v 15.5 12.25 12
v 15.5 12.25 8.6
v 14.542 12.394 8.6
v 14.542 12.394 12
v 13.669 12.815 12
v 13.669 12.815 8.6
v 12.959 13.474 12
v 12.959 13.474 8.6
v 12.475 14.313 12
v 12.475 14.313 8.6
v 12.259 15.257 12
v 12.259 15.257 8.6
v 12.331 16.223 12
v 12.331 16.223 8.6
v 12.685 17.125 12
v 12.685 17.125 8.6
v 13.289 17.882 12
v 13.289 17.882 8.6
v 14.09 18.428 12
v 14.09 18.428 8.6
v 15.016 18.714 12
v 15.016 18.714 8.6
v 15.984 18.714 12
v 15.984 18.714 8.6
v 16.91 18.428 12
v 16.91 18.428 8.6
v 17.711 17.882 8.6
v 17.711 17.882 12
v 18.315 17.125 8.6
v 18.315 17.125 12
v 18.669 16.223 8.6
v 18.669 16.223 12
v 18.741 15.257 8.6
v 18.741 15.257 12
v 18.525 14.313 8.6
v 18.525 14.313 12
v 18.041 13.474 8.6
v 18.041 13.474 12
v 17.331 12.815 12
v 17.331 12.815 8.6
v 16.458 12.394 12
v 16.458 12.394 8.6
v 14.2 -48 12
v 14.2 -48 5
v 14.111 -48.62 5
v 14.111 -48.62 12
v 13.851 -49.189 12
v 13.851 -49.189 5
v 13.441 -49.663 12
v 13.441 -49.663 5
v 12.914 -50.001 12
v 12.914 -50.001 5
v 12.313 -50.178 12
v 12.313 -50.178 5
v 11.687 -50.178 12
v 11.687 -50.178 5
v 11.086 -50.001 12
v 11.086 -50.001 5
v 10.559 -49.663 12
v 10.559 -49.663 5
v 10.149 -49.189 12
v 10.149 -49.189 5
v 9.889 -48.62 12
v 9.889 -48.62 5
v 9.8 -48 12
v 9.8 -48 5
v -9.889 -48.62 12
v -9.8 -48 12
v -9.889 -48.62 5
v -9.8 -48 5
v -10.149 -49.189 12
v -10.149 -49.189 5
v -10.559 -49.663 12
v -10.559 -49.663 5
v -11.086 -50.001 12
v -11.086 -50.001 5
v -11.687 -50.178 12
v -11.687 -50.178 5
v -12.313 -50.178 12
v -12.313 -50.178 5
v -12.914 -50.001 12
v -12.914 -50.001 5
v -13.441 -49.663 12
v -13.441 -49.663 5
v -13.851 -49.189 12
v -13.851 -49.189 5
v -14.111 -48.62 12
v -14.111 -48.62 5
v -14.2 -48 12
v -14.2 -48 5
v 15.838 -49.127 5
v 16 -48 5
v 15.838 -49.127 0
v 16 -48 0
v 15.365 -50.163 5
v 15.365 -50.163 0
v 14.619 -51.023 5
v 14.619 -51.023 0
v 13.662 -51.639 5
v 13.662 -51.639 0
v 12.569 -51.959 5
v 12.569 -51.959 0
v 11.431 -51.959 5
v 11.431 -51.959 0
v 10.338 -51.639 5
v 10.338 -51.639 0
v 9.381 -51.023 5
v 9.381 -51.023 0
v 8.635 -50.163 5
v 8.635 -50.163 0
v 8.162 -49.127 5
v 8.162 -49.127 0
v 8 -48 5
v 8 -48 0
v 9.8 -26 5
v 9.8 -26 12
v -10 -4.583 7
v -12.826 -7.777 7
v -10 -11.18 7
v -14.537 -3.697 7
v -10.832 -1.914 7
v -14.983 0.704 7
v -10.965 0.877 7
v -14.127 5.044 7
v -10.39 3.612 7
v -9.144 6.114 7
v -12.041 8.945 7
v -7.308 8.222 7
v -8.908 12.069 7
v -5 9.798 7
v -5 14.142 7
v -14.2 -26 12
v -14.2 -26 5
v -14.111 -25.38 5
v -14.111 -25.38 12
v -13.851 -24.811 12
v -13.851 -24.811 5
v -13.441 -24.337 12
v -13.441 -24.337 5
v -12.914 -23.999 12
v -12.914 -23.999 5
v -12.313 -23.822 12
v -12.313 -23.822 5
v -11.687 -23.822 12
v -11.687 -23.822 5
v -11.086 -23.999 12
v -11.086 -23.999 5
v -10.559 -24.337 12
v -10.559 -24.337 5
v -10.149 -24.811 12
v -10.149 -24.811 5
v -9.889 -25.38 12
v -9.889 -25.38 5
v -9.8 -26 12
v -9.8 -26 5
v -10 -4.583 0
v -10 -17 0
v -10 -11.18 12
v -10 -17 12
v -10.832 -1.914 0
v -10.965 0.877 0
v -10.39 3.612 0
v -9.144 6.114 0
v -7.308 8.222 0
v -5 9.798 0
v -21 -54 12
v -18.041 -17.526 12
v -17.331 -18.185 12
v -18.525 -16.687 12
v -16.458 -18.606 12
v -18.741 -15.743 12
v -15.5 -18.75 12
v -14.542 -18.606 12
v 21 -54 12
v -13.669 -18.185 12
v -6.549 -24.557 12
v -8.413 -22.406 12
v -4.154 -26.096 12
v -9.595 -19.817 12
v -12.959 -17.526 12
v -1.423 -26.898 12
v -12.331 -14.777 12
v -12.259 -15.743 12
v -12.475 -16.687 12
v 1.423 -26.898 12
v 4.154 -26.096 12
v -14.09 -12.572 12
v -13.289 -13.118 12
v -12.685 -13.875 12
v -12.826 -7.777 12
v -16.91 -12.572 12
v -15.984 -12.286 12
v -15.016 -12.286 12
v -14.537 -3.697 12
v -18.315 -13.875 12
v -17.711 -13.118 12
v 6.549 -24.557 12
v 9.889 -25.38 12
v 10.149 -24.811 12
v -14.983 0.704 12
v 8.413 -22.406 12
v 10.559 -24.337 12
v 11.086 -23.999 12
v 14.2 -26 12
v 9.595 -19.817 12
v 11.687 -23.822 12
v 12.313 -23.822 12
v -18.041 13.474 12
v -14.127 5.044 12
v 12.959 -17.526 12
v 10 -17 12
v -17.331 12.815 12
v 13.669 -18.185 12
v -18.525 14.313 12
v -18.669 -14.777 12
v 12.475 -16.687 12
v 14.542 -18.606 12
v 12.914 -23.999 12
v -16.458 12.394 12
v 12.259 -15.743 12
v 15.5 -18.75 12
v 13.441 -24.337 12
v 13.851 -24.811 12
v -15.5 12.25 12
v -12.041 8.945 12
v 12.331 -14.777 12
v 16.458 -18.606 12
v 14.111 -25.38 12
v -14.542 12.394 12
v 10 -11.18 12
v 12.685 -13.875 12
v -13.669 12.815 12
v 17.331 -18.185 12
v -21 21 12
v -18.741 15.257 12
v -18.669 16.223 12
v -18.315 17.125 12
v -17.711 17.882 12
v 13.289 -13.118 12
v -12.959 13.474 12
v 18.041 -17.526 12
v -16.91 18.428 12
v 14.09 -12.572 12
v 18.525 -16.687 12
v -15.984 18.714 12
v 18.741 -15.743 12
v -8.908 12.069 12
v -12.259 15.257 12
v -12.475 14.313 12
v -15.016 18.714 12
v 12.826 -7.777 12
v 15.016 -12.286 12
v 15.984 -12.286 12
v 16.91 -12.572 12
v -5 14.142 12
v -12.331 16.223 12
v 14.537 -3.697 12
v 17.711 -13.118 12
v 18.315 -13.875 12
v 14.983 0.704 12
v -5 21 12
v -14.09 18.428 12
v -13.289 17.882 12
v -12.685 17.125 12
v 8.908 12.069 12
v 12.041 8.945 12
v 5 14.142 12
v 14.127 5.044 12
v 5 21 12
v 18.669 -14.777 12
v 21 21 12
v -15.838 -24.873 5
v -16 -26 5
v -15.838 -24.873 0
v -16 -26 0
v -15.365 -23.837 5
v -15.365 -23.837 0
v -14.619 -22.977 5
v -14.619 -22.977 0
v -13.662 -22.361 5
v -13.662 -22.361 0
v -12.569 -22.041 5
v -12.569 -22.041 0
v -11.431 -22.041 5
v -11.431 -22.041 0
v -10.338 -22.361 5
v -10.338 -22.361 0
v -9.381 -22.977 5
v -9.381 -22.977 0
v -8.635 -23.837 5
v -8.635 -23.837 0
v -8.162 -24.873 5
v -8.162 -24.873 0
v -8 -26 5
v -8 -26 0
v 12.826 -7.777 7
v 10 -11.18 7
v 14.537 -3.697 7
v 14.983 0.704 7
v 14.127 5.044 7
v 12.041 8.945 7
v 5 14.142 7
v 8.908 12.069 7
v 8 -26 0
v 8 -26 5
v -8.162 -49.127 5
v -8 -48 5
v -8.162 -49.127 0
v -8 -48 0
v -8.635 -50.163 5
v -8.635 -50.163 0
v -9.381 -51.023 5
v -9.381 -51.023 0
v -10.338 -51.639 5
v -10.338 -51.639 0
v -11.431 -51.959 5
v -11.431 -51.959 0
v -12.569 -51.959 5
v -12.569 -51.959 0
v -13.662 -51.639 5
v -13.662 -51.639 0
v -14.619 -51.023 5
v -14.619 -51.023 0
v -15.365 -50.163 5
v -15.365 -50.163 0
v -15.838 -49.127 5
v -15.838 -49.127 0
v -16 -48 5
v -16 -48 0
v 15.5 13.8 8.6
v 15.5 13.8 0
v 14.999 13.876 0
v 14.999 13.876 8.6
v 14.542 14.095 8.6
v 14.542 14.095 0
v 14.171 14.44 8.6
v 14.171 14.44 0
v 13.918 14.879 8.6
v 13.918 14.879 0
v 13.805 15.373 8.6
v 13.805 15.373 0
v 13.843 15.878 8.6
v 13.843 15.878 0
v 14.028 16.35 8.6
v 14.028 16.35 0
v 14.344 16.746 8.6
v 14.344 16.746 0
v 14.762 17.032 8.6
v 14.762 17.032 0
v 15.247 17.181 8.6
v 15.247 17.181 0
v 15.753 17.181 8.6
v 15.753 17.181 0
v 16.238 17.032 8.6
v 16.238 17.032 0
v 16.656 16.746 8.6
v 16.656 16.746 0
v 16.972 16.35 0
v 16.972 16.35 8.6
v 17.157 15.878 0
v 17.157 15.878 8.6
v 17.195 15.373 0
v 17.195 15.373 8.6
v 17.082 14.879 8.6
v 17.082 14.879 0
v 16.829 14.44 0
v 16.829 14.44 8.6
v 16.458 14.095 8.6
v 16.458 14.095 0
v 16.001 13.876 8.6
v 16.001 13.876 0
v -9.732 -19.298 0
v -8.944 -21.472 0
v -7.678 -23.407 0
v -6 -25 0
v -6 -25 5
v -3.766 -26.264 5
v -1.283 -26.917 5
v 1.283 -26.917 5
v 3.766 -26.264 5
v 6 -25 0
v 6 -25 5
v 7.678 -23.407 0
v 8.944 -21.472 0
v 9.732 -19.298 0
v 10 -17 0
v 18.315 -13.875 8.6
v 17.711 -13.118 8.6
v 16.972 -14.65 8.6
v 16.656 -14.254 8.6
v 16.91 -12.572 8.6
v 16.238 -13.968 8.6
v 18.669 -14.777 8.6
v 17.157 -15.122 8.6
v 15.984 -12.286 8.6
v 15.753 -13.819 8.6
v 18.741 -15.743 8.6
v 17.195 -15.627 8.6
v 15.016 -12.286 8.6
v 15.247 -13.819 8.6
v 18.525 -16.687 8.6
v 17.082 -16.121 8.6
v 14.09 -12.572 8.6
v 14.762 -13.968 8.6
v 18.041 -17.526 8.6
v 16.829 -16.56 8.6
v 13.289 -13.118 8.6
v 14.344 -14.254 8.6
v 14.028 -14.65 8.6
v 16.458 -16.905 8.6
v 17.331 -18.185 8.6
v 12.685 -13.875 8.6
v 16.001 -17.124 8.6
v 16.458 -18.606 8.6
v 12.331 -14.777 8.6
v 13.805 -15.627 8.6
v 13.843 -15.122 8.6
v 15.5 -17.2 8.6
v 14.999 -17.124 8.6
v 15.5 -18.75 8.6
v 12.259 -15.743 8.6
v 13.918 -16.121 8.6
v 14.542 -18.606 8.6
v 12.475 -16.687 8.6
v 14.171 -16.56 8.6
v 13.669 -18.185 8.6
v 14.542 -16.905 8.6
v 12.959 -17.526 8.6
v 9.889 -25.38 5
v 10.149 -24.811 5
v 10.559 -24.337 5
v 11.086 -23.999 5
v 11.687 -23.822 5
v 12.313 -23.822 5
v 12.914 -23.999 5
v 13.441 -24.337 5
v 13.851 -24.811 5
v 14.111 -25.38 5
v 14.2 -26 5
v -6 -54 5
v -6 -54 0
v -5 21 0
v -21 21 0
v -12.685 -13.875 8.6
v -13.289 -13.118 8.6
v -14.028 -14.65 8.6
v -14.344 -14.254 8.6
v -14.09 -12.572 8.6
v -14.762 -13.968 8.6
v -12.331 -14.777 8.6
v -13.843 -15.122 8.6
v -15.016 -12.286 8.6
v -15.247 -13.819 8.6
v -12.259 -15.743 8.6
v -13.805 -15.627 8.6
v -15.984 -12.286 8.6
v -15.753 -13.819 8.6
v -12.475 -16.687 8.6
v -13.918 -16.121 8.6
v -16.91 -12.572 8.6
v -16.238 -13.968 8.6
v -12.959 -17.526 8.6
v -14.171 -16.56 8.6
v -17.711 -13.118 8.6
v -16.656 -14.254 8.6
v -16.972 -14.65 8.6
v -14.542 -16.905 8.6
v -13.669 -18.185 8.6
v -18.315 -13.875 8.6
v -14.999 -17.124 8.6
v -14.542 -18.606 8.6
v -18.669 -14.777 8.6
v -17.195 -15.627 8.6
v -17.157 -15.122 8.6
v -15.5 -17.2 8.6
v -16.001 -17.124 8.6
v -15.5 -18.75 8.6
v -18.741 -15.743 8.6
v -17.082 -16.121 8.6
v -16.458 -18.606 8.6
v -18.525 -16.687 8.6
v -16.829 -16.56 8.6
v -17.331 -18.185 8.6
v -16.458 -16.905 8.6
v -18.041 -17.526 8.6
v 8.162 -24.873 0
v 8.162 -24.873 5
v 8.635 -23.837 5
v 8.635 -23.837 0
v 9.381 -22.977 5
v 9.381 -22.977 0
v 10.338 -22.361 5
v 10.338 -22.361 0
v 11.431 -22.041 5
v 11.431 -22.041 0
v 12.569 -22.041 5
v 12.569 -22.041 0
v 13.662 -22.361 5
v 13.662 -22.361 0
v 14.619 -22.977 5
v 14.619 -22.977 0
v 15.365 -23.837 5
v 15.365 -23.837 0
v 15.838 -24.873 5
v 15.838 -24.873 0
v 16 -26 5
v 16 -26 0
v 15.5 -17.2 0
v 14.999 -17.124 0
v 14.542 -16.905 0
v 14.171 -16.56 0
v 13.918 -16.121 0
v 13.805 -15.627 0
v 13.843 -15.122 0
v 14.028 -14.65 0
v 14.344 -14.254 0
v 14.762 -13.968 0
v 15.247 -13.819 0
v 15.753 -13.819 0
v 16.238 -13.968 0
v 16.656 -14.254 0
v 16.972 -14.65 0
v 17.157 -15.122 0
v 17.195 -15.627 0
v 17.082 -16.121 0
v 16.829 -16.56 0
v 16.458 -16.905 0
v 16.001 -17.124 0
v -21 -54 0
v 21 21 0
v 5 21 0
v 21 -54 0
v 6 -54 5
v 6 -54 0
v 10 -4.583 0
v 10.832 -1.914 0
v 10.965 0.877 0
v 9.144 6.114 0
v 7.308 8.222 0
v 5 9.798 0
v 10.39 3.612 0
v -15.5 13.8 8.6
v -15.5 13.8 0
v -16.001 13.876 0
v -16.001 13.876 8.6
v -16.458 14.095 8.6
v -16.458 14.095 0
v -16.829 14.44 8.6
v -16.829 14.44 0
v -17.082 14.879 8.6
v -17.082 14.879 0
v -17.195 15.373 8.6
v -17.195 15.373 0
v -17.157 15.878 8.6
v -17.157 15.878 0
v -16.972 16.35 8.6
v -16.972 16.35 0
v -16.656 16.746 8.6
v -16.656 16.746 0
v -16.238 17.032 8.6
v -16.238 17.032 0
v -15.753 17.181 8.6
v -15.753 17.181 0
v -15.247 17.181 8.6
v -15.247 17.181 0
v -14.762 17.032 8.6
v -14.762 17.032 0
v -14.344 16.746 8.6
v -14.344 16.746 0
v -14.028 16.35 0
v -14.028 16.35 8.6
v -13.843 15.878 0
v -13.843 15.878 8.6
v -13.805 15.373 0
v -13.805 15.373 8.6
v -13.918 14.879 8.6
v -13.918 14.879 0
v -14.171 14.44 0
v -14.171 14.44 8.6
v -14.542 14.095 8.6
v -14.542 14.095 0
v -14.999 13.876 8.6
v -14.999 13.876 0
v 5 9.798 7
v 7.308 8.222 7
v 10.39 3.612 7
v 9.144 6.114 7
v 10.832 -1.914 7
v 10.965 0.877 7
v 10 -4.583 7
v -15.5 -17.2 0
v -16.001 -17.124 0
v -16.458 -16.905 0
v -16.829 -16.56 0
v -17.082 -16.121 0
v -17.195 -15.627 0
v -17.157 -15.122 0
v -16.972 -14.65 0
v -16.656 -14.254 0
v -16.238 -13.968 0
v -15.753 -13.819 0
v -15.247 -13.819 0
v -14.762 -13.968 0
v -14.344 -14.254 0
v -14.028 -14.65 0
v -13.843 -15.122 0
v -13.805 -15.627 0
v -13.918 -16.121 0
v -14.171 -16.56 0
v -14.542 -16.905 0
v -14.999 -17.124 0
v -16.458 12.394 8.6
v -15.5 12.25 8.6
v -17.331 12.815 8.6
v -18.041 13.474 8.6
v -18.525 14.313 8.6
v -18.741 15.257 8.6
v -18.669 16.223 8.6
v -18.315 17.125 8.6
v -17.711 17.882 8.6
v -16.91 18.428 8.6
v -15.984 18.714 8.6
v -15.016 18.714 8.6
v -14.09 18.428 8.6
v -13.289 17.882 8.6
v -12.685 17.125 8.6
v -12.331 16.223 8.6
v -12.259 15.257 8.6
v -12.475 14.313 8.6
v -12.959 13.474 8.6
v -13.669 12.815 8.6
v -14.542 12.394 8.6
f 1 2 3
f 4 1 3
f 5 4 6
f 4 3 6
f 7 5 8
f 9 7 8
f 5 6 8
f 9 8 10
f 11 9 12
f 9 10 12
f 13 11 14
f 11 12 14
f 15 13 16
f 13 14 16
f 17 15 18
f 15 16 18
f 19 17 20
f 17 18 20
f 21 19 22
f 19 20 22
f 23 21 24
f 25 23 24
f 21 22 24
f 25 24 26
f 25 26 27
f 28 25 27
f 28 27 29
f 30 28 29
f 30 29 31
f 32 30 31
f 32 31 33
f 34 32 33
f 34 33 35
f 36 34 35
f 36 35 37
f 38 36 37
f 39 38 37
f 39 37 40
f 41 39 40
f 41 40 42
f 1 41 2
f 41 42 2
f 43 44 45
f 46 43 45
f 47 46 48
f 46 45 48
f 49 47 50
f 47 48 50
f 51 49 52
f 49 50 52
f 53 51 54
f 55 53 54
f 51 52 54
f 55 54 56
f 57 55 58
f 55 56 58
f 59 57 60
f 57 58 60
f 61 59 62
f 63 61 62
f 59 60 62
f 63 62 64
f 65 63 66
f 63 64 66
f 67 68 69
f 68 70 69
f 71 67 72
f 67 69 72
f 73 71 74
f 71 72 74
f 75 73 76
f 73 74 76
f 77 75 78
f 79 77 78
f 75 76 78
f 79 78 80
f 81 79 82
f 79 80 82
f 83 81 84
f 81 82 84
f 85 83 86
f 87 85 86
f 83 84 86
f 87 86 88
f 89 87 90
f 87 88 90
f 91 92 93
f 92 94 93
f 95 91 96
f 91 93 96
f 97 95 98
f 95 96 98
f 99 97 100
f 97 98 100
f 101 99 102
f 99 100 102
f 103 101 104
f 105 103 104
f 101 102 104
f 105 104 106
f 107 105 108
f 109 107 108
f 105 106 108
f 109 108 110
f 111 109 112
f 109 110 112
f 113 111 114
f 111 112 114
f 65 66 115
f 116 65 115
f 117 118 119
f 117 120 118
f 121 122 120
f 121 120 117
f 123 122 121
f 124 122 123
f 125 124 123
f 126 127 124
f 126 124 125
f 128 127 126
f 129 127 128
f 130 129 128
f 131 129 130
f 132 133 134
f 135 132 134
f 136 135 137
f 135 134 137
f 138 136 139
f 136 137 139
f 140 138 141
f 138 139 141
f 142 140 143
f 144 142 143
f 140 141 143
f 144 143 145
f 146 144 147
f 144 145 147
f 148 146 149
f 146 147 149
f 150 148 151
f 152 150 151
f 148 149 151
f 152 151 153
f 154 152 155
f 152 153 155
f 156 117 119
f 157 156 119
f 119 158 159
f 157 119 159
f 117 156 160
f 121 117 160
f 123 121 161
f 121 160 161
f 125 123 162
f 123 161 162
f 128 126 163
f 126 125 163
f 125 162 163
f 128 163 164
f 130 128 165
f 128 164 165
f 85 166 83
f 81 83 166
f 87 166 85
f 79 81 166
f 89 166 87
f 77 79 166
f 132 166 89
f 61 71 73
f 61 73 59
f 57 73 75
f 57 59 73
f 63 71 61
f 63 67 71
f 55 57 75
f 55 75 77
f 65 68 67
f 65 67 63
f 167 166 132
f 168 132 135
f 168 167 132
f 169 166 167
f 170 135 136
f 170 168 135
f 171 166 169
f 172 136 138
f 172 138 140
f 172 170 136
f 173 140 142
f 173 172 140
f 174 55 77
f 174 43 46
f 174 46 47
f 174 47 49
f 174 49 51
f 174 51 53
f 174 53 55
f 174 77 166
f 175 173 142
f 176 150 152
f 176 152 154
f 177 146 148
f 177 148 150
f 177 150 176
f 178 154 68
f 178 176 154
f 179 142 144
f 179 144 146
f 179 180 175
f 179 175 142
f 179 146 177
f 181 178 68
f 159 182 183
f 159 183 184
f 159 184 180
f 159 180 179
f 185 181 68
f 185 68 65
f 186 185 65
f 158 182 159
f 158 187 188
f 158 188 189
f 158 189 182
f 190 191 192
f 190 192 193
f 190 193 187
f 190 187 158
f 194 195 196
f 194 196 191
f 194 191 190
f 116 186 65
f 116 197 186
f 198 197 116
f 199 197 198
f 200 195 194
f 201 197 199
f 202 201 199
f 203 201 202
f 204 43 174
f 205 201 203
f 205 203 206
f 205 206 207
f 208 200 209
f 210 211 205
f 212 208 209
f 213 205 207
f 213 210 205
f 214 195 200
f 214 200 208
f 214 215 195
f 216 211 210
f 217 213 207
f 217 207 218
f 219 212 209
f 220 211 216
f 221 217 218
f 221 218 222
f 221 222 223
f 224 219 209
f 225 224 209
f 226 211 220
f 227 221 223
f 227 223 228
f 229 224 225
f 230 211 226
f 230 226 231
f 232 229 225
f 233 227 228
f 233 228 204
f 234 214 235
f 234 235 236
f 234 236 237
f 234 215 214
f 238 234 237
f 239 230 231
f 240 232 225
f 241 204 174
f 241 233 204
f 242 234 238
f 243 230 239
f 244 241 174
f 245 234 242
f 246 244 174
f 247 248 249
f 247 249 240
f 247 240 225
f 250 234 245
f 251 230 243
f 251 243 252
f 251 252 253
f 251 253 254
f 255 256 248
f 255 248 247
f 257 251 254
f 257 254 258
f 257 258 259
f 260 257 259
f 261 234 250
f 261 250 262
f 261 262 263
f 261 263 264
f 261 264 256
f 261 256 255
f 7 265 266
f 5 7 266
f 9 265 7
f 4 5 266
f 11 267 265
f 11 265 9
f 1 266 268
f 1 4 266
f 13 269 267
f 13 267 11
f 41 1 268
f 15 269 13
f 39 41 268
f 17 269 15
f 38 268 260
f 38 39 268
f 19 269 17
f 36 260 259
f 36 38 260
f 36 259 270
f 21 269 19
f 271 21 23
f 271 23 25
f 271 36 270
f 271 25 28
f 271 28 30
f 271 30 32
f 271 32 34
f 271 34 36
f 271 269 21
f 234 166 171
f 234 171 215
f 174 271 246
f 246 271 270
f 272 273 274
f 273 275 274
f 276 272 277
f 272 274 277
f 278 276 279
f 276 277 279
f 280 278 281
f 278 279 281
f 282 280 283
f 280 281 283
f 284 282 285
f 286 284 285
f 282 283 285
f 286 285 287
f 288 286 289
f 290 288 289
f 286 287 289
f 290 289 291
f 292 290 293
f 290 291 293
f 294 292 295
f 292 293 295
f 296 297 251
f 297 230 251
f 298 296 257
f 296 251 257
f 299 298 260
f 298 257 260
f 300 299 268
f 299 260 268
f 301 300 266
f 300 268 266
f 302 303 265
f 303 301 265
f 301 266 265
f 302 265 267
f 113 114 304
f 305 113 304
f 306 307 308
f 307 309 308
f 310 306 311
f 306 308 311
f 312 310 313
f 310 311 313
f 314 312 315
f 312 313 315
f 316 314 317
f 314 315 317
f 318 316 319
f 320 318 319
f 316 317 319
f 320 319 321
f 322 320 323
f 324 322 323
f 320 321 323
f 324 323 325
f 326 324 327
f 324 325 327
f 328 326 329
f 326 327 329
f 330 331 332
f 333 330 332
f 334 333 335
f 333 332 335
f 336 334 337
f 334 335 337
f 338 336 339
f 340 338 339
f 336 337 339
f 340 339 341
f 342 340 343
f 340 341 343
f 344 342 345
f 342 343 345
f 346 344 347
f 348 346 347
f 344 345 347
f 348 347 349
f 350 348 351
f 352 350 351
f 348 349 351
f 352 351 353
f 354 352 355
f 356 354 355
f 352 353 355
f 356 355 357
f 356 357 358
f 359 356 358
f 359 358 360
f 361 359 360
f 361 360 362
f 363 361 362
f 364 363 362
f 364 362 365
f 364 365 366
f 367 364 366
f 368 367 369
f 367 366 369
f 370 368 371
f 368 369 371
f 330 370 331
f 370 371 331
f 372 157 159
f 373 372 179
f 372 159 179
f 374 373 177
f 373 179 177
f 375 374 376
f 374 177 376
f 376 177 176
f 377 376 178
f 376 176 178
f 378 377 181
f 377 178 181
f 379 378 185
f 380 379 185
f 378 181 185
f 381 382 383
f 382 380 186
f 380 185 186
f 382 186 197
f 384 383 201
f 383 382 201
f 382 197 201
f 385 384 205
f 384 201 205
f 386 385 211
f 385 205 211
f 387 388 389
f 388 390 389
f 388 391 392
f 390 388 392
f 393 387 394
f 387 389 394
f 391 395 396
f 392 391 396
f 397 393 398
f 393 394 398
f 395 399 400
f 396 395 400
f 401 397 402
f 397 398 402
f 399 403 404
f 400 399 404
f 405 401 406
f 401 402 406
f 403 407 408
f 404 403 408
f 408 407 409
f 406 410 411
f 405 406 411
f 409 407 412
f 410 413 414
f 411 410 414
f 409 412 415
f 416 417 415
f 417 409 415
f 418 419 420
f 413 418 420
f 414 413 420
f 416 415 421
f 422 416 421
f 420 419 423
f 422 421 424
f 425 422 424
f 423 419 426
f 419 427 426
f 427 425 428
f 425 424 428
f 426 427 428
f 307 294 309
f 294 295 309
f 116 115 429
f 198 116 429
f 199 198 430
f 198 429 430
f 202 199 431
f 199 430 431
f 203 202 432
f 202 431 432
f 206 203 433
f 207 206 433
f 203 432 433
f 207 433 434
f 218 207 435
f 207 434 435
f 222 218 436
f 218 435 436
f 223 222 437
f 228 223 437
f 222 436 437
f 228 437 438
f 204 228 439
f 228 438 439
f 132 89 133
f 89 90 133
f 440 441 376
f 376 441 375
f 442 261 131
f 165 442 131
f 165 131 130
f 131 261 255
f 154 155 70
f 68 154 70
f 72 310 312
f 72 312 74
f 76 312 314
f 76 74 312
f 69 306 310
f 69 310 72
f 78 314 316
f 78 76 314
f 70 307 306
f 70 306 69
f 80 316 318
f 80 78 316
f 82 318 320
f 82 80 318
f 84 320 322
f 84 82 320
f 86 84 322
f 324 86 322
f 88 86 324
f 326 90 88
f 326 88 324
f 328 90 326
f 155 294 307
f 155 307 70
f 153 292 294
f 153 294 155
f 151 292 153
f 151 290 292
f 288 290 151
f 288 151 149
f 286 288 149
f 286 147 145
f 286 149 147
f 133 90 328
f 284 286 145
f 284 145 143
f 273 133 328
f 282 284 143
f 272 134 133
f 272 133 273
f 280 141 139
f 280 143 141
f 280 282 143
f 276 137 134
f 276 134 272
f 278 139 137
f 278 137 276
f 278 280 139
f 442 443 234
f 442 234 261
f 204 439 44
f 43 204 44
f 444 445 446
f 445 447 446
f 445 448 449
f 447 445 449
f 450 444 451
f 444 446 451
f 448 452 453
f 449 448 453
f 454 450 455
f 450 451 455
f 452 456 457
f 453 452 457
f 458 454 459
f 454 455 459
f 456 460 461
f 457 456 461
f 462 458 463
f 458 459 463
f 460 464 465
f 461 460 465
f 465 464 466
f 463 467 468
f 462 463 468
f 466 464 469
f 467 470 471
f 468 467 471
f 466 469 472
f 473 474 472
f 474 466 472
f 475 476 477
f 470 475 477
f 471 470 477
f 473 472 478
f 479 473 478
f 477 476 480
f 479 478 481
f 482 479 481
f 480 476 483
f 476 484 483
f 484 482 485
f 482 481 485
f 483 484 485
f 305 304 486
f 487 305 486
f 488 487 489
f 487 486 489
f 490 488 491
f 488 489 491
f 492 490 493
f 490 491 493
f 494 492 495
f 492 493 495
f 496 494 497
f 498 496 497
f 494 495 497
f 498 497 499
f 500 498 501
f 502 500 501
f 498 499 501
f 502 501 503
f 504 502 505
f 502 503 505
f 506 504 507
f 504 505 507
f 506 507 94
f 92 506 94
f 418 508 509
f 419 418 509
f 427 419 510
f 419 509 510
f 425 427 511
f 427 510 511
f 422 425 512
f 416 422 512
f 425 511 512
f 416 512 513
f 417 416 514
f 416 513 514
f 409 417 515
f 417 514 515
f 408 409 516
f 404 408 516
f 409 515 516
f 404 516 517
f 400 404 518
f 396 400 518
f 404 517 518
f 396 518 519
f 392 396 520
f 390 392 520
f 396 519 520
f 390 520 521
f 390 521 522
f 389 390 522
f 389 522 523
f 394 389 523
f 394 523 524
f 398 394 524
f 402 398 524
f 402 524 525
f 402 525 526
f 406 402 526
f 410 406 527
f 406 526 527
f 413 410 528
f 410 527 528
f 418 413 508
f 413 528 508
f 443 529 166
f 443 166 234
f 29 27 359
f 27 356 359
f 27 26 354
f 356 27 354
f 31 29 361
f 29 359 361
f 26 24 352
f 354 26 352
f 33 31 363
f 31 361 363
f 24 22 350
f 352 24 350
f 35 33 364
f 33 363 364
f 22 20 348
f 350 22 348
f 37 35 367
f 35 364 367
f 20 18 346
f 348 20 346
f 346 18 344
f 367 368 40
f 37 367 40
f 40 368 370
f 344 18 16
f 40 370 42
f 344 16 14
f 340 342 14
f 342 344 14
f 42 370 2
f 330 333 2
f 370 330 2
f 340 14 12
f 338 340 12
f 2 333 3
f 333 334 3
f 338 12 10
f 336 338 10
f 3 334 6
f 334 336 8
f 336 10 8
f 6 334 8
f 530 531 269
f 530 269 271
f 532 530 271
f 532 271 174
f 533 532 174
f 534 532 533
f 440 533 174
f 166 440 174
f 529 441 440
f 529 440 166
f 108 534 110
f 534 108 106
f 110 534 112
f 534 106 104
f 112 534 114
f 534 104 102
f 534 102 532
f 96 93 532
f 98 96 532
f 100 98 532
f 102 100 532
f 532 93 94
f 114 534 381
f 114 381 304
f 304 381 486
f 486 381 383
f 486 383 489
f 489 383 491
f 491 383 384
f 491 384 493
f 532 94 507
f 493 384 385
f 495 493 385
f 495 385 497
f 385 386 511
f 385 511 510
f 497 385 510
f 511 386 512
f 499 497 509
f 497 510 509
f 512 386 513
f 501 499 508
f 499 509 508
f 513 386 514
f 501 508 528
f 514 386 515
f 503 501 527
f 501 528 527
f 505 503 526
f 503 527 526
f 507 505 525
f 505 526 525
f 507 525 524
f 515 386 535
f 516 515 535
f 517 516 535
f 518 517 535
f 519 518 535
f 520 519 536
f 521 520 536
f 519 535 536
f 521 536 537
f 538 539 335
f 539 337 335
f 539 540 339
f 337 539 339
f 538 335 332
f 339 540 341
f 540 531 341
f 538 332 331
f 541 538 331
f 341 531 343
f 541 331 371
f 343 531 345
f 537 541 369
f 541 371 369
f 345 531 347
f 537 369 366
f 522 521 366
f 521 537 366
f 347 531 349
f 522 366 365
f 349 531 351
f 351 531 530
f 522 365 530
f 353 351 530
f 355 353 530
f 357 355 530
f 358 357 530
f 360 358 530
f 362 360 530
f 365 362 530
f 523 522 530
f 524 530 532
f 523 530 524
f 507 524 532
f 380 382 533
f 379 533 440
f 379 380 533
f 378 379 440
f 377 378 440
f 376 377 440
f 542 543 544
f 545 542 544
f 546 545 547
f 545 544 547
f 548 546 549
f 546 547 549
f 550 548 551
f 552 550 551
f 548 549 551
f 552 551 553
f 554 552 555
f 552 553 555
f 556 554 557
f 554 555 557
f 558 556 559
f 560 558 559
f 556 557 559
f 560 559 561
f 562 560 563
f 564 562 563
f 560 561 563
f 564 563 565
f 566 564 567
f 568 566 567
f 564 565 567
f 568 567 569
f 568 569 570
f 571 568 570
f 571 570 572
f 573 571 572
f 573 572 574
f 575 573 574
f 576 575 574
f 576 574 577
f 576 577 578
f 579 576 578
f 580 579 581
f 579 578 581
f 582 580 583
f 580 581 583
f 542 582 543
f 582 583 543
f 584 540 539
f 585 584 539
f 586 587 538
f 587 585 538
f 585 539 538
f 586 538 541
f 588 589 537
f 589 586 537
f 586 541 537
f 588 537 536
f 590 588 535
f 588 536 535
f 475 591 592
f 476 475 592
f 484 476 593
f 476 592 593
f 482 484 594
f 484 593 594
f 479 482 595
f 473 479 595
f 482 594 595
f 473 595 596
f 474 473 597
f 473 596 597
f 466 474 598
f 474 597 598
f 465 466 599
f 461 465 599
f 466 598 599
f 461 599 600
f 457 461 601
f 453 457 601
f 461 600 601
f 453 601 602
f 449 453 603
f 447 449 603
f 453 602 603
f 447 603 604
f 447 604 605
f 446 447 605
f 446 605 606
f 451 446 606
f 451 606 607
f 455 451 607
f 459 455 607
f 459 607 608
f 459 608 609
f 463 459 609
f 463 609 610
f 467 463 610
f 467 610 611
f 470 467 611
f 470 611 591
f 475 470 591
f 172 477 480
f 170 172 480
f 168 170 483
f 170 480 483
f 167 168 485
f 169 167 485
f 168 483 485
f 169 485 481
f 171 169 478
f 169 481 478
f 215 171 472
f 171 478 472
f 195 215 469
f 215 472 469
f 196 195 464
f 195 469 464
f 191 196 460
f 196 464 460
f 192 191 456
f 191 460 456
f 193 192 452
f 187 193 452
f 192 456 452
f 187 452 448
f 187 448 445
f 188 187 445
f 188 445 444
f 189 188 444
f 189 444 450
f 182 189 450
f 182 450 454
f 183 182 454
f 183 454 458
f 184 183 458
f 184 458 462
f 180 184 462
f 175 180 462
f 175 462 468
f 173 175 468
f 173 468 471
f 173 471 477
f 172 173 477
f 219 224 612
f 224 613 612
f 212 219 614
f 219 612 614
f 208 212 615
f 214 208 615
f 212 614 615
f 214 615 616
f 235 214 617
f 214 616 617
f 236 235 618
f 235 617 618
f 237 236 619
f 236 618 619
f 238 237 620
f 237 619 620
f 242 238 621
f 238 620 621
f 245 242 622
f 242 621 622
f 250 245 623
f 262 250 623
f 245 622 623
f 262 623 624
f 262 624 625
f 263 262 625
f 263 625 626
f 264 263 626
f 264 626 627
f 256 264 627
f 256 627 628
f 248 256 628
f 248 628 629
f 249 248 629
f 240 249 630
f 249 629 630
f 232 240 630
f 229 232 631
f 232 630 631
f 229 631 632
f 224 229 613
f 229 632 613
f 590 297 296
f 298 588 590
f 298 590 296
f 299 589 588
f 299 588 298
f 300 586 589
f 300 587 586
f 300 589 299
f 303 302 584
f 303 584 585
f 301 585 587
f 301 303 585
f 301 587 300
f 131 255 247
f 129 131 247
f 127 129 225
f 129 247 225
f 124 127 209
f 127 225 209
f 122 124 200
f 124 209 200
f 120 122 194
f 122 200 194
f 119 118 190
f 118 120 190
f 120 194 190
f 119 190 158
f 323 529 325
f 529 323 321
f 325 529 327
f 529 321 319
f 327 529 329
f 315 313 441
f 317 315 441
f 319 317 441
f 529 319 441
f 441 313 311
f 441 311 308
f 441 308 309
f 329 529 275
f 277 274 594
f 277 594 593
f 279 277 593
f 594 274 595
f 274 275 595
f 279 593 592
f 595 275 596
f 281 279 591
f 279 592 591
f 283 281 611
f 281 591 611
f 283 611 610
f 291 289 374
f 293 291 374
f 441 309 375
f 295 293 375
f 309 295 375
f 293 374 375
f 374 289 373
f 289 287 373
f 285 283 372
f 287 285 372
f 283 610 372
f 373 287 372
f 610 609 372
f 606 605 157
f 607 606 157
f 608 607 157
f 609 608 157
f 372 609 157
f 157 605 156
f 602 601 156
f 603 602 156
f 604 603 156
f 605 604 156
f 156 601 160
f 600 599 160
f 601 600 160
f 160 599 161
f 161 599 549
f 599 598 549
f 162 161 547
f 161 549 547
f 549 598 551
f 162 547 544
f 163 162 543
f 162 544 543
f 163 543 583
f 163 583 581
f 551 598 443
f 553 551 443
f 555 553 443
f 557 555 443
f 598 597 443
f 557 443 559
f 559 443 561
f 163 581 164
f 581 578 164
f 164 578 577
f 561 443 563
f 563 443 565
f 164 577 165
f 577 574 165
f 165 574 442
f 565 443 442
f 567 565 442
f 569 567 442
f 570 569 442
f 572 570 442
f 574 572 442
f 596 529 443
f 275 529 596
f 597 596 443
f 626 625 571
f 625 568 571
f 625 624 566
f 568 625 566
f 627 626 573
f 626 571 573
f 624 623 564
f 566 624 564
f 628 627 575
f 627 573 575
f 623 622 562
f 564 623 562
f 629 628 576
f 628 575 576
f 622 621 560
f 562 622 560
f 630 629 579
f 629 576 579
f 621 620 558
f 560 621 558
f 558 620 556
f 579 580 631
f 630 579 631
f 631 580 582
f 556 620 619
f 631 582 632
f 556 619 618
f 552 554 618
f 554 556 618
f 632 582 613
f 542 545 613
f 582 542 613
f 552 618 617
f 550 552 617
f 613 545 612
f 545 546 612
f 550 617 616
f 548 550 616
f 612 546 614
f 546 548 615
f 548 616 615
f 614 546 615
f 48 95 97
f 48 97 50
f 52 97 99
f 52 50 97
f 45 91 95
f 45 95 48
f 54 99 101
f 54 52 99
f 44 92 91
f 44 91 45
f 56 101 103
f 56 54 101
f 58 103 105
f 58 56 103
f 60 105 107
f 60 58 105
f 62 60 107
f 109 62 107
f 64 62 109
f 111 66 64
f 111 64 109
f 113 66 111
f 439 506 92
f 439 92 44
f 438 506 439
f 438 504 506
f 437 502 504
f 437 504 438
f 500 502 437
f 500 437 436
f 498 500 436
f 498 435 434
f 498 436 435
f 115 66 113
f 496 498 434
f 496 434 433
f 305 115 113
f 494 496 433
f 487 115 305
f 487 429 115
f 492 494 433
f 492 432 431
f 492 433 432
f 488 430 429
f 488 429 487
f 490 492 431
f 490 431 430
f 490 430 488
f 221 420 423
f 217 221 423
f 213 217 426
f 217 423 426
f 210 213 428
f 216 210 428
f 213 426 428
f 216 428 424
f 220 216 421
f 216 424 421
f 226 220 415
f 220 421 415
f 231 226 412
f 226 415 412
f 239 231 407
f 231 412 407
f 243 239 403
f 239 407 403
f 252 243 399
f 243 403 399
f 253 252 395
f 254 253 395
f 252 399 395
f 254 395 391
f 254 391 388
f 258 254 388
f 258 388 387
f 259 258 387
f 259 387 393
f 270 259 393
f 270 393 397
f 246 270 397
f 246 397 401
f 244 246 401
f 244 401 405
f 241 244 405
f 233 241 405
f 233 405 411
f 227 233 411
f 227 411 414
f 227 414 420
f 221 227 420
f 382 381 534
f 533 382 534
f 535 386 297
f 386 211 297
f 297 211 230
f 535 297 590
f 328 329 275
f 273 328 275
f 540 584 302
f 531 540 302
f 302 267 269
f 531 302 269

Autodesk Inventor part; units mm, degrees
ref_plane "YZ Plane" through (0, 0, 0) normal (1, 0, 0) x (0, 1, 0)
ref_plane "XZ Plane" through (0, 0, 0) normal (0, 1, 0) x (-1, 0, 0)
ref_plane "XY Plane" through (0, 0, 0) normal (0, 0, 1) x (1, 0, 0)
sketch "Skizze1" plane through (0, 0, 0) normal (0, 0, 1) x (1, 0, 0)
  line L0 (-29.4, 0) -> (29.4, 0) projected
  line L1 (0, -69) -> (0, 36) projected
  line L2 (21, -54) -> (-21, -54)
  line L3 (-21, -54) -> (-21, 21)
  line L4 (-21, 21) -> (21, 21)
  line L5 (21, 21) -> (21, -54)
  line L6 (21, -54) -> (-21, 21) construction
  line L7 (-21, -54) -> (21, 21) construction
  circle A0 centre (0, 0) radius 11
  point P0 (0, -16.5)
  dimension "d0" = 42
  dimension "d1" = 75
  dimension "d3" = 22
  dimension "d4" = 21
extrude "Extrusion1" add sketch "Skizze1" along normal blind 12 contours L3 L4 L1 A0 L0 | L0 A0 L1 L2 L3 | L1 L4 L5 L0 A0 | A0 L0 L5 L2 L1
sketch "Skizze2" plane through (0, 0, 12) normal (0, 0, 1) x (1, 0, 0)
  line L0 (21, -54) -> (21, 21) projected
  line L1 (21, 21) -> (-21, 21) projected
  line L2 (-21, 21) -> (-21, -54) projected
  line L3 (-21, -54) -> (21, -54) projected
  circle A0 centre (0, 0) radius 11 projected
  line L4 (15.5, -15.5) -> (-15.5, -15.5)
  line L5 (-15.5, -15.5) -> (-15.5, 15.5)
  line L6 (-15.5, 15.5) -> (15.5, 15.5)
  line L7 (15.5, 15.5) -> (15.5, -15.5)
  line L8 (15.5, -15.5) -> (-15.5, 15.5) construction
  line L9 (-15.5, -15.5) -> (15.5, 15.5) construction
  dimension "d7" = 31
  dimension "d8" = 31
hole "Bohrung1" at (-15.5, 15.5, 12) at (15.5, 15.5, 12) at (15.5, -15.5, 12) at (-15.5, -15.5, 12) direction (0, 0, -1) diameter 3.4 end through all counterbore diameter 6.5 counterbore depth 3.4
sketch "Skizze3" plane through (0, 0, 0) normal (0, 0, -1) x (-1, 0, 0)
  circle A0 centre (15.5, -15.5) radius 1.7 projected
  circle A1 centre (-15.5, -15.5) radius 1.7 projected
  circle A2 centre (-15.5, 15.5) radius 1.7 projected
  circle A3 centre (15.5, 15.5) radius 1.7 projected
  line L0 (-21, -54) -> (-21, 21) projected
  line L1 (21, -54) -> (-21, -54) projected
  line L2 (21, 21) -> (21, -54) projected
  line L3 (-21, 21) -> (21, 21) projected
  circle A4 centre (0, 0) radius 11 projected
  line L4 (29.4, 0) -> (-29.4, 0) projected
  line L5 (0, -69) -> (0, 36) projected
  line L6 (-12, -48) -> (-12, -26) construction
  line L7 (-8, -48) -> (-8, -26)
  line L8 (-16, -26) -> (-16, -48)
  arc A5 (-16, -48) -> (-8, -48) centre (-12, -48) ccw
  arc A6 (-8, -26) -> (-16, -26) centre (-12, -26) ccw
  line L9 (12, -48) -> (12, -26) construction
  line L10 (16, -48) -> (16, -26)
  line L11 (8, -26) -> (8, -48)
  arc A7 (8, -48) -> (16, -48) centre (12, -48) ccw
  arc A8 (16, -26) -> (8, -26) centre (12, -26) ccw
  point P0 (-12, -37)
  point P1 (12, -37)
  dimension "d16" = 24
  dimension "d17" = 8
  dimension "d18" = 8
  dimension "d19" = 6
  dimension "d20" = 22
extrude "Extrusion2" cut sketch "Skizze3" against normal blind 5 contours A5 L8 A6 L7 | A7 L11 A8 L10
sketch "Skizze4" plane through (0, 0, 0) normal (0, 0, -1) x (-1, 0, 0)
  arc A0 (-8, -26) -> (-16, -26) centre (-12, -26) ccw projected
  line L0 (-16, -48) -> (-16, -26) projected
  arc A1 (-16, -48) -> (-8, -48) centre (-12, -48) ccw projected
  line L1 (-8, -26) -> (-8, -48) projected
  arc A2 (16, -26) -> (8, -26) centre (12, -26) ccw projected
  line L2 (8, -48) -> (8, -26) projected
  arc A3 (8, -48) -> (16, -48) centre (12, -48) ccw projected
  line L3 (16, -26) -> (16, -48) projected
  line L4 (12, -48) -> (12, -26) construction
  line L5 (14.2, -48) -> (14.2, -26)
  line L6 (9.8, -26) -> (9.8, -48)
  arc A4 (9.8, -48) -> (14.2, -48) centre (12, -48) ccw
  arc A5 (14.2, -26) -> (9.8, -26) centre (12, -26) ccw
  line L7 (-12, -48) -> (-12, -26) construction
  line L8 (-9.8, -48) -> (-9.8, -26)
  line L9 (-14.2, -26) -> (-14.2, -48)
  arc A6 (-14.2, -48) -> (-9.8, -48) centre (-12, -48) ccw
  arc A7 (-9.8, -26) -> (-14.2, -26) centre (-12, -26) ccw
  point P0 (0, 0)
  point P1 (12, -37)
  point P2 (-12, -37)
  dimension "d23" = 4.4
  dimension "d24" = 4.4
extrude "Extrusion3" cut sketch "Skizze4" against normal through all contours A4 L6 A5 L5 | A6 L9 A7 L8
sketch "Skizze5" plane through (0, 0, 12) normal (0, 0, 1) x (1, 0, 0)
  line L0 (-9.8, -26) -> (-9.8, -48) projected
  arc A0 (-14.2, -48) -> (-9.8, -48) centre (-12, -48) ccw projected
  line L1 (-14.2, -48) -> (-14.2, -26) projected
  arc A1 (-9.8, -26) -> (-14.2, -26) centre (-12, -26) ccw projected
  line L2 (14.2, -26) -> (14.2, -48) projected
  arc A2 (9.8, -48) -> (14.2, -48) centre (12, -48) ccw projected
  line L3 (9.8, -48) -> (9.8, -26) projected
  arc A3 (14.2, -26) -> (9.8, -26) centre (12, -26) ccw projected
  circle A4 centre (-15.5, -15.5) radius 3.25 projected
  circle A5 centre (15.5, -15.5) radius 3.25 projected
  circle A6 centre (15.5, 15.5) radius 3.25 projected
  circle A7 centre (-15.5, 15.5) radius 3.25 projected
  line L4 (21, -54) -> (21, 21) projected
  line L5 (21, 21) -> (-21, 21) projected
  line L6 (-21, 21) -> (-21, -54) projected
  line L7 (-21, -54) -> (21, -54) projected
  circle A8 centre (0, 0) radius 11 projected
  circle A9 centre (0, 0) radius 15
  dimension "d27" = 30
extrude "Extrusion4" cut sketch "Skizze5" against normal blind 5 contours A9
sketch "Skizze6" plane through (0, 0, 12) normal (0, 0, 1) x (1, 0, 0)
  circle A0 centre (0, 0) radius 15 projected
  line L0 (-9.8, -26) -> (-9.8, -48) projected
  arc A1 (-14.2, -48) -> (-9.8, -48) centre (-12, -48) ccw projected
  line L1 (-14.2, -48) -> (-14.2, -26) projected
  arc A2 (-9.8, -26) -> (-14.2, -26) centre (-12, -26) ccw projected
  line L2 (14.2, -26) -> (14.2, -48) projected
  arc A3 (9.8, -48) -> (14.2, -48) centre (12, -48) ccw projected
  line L3 (9.8, -48) -> (9.8, -26) projected
  arc A4 (14.2, -26) -> (9.8, -26) centre (12, -26) ccw projected
  circle A5 centre (-15.5, -15.5) radius 3.25 projected
  circle A6 centre (15.5, -15.5) radius 3.25 projected
  circle A7 centre (15.5, 15.5) radius 3.25 projected
  circle A8 centre (-15.5, 15.5) radius 3.25 projected
  line L4 (21, -54) -> (21, 21) projected
  line L5 (21, 21) -> (-21, 21) projected
  line L6 (-21, 21) -> (-21, -54) projected
  line L7 (-21, -54) -> (21, -54) projected
  line L8 (-29.4, 0) -> (29.4, 0) projected
  line L9 (0, -69) -> (0, 36) projected
  line L10 (-5, 8) -> (5, 8)
  line L11 (5, 8) -> (5, 26)
  line L12 (5, 26) -> (-5, 26)
  line L13 (-5, 26) -> (-5, 8)
  line L14 (-5, 8) -> (5, 26) construction
  line L15 (5, 8) -> (-5, 26) construction
  point P0 (0, 17)
  dimension "d30" = 18
  dimension "d31" = 10
  dimension "d32" = 8
extrude "Extrusion5" cut sketch "Skizze6" against normal through all contours L11 L10 L9 A0 | A0 L9 L5 L11 | L9 L10 L13 A0 | A0 L13 L5 L9 | L5 L9 L12 L11 | L5 L13 L12 L9
sketch "Skizze7" plane through (0, 0, 12) normal (0, 0, 1) x (1, 0, 0)
  line L0 (5, 14.1421) -> (5, 9.798) projected
  arc A0 (-5, 9.798) -> (5, 9.798) centre (0, 0) ccw projected
  line L1 (-5, 9.798) -> (-5, 14.1421) projected
  arc A1 (-5, 14.1421) -> (5, 14.1421) centre (0, 0) ccw projected
  line L2 (-29.4, 0) -> (29.4, 0) projected
  line L3 (0, -69) -> (0, 36) projected
  line L4 (0, 0) -> (0, -17) construction
  line L5 (-10, 0) -> (-10, -17)
  line L6 (10, -17) -> (10, 0)
  arc A2 (10, 0) -> (-10, 0) centre (0, 0) ccw
  arc A3 (-10, -17) -> (10, -17) centre (0, -17) ccw
  point P0 (0, -8.5)
  dimension "d35" = 20
  dimension "d36" = 17
extrude "Extrusion6" cut sketch "Skizze7" against normal through all contours L6 A3 L3 A1 | A1 L3 A0 L6 | A0 L3 L2 L6 | L2 L3 A2 | L3 A3 L5 A1 | A1 L5 A0 L3 | A0 L5 L2 L3 | L2 A2 L3
sketch "Skizze8" plane through (0, 0, 0) normal (0, 0, -1) x (-1, 0, 0)
  line L0 (-5, 9.798) -> (-5, 21) projected
  line L1 (-21, 21) -> (-5, 21) projected
  line L2 (-21, -54) -> (-21, 21) projected
  line L3 (21, -54) -> (-21, -54) projected
  line L4 (21, 21) -> (21, -54) projected
  line L5 (5, 21) -> (21, 21) projected
  line L6 (5, 21) -> (5, 9.798) projected
  arc A0 (-5, 9.798) -> (-10, -4.5826) centre (0, 0) ccw projected
  circle A1 centre (15.5, 15.5) radius 1.7 projected
  circle A2 centre (-15.5, 15.5) radius 1.7 projected
  circle A3 centre (-15.5, -15.5) radius 1.7 projected
  circle A4 centre (15.5, -15.5) radius 1.7 projected
  line L7 (-16, -48) -> (-16, -26) projected
  arc A5 (-8, -26) -> (-16, -26) centre (-12, -26) ccw projected
  line L8 (-8, -26) -> (-8, -48) projected
  arc A6 (-16, -48) -> (-8, -48) centre (-12, -48) ccw projected
  line L9 (8, -48) -> (8, -26) projected
  arc A7 (16, -26) -> (8, -26) centre (12, -26) ccw projected
  line L10 (16, -26) -> (16, -48) projected
  arc A8 (8, -48) -> (16, -48) centre (12, -48) ccw projected
  line L11 (29.4, 0) -> (-29.4, 0) projected
  line L12 (0, -69) -> (0, 36) projected
  line L13 (10, -4.5826) -> (10, -17) projected
  arc A9 (-10, -17) -> (10, -17) centre (0, -17) ccw projected
  line L14 (-10, -17) -> (-10, -4.5826) projected
  arc A10 (10, -4.5826) -> (5, 9.798) centre (0, 0) ccw projected
  line L15 (0, 0) -> (0, -60) construction
  line L16 (-6, 0) -> (-6, -60)
  line L17 (6, -60) -> (6, 0)
  arc A11 (6, 0) -> (-6, 0) centre (0, 0) ccw
  arc A12 (-6, -60) -> (6, -60) centre (0, -60) ccw
  point P0 (0, -30)
  point P1 (11, 0)
  point P2 (21, 0)
  point P3 (-21, 0)
  point P4 (-11, 0)
  point P5 (-6, -25)
  point P6 (6, -25)
  point P7 (0, -66)
  point P8 (0, -54)
  point P9 (-6, -54)
  point P10 (0, 6)
  point P11 (0, -27)
  point P12 (6, -54)
  dimension "d39" = 12
  dimension "d40" = 60
extrude "Extrusion7" cut sketch "Skizze8" against normal blind 5 contours A11 L12 L11 | L11 L12 A9 L16 | L12 A11 L11 | L11 L17 A9 L12 | A9 L12 L3 L16 | A9 L17 L3 L12 | L3 L12 A12 L16 | L3 L17 A12 L12
equation "\"d18\" = d17"
equation "\"d24\" = d23"
properties part number "24_0497_008"
